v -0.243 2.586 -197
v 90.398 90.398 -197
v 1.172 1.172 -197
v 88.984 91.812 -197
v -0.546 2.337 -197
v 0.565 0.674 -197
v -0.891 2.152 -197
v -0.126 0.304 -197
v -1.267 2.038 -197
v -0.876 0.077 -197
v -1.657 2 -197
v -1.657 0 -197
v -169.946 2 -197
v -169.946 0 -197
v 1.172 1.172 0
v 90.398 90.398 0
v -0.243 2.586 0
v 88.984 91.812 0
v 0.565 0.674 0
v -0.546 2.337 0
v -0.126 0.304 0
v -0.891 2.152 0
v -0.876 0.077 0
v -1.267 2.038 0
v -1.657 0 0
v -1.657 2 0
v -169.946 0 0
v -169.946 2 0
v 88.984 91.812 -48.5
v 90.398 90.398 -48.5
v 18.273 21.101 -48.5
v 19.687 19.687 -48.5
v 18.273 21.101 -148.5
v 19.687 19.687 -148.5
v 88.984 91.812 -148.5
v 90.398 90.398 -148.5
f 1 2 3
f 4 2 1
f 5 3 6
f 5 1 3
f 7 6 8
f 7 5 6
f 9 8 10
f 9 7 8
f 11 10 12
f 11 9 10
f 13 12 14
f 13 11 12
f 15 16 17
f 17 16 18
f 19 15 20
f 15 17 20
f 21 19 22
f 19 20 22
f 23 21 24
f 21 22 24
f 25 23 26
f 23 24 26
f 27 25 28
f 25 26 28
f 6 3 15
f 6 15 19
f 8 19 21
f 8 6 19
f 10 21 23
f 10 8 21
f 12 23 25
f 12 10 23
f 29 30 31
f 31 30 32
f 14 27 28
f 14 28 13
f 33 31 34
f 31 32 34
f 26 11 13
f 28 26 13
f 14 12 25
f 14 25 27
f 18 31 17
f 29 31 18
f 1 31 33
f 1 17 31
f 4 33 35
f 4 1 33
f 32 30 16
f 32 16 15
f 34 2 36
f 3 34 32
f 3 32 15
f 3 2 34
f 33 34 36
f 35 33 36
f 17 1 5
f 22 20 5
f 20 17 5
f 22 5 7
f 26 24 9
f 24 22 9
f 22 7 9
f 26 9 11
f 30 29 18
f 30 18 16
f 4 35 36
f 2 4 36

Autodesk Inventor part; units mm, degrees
ref_plane "YZ Plane" through (0, 0, 0) normal (1, 0, 0) x (0, 1, 0)
ref_plane "XZ Plane" through (0, 0, 0) normal (0, 1, 0) x (-1, 0, 0)
ref_plane "XY Plane" through (0, 0, 0) normal (0, 0, 1) x (1, 0, 0)
sketch "Sketch1" plane through (0, 0, 0) normal (0, 1, 0) x (-1, 0, 0)
  line L0 (0, 0) -> (169.946, 0)
  line L1 (169.946, 0) -> (169.946, -197)
  line L2 (169.946, -197) -> (0, -197)
  line L3 (0, -197) -> (0, 0)
  dimension "d0" = 197
  dimension "d1" = 169.946
extrude "Plate1" add sketch "Sketch1" along normal blind 2
sketch "Sketch2" plane through (-1.4142, 1.4142, -197) normal (0.7071068, -0.7071068, 0) x (0.7071068, 0.7071068, 0)
  line L0 (0, 197) -> (0, 0)
  line L1 (0, 0) -> (127.842, 0)
  line L2 (127.842, 0) -> (127.842, 197)
  line L3 (127.842, 197) -> (0, 197)
edge flange "Flange1" height 127.842 angle 45 thickness 2 bend radius 2 thickness toward (0.7071068, -0.7071068, 0) relief tear relief width 2 relief depth 1 edges at (0, 2, -98.5) wall of the first edge with corners at (-1.4142, 1.4142, 0) (-1.4142, 1.4142, -197) (88.9837, 91.8122, -197) (88.9837, 91.8122, 0)
bend "Bend1"
corner "Corner1"
sketch "Sketch3" plane through (90.3979, 90.3979, 0) normal (0.7071068, -0.7071068, 0) x (-0.7071068, -0.7071068, 0)
  line L0 (0, 48.5) -> (100, 48.5)
  line L1 (100, 48.5) -> (100, 148.5)
  line L2 (100, 148.5) -> (0, 148.5)
  line L3 (0, 148.5) -> (0, 48.5)
  line L4 (0, 197) -> (126.1851, 197) projected
  line L5 (0, 0) -> (0, 197) projected
  point P0 (127.842, 0)
  point P1 (63.0926, 197)
  dimension "d13" = 100
  dimension "d14" = 100
  dimension "d15" = 48.5
extrude "Cut1" cut sketch "Sketch3" against normal blind 2
equation "\"d14\" = d13"
equation "\"d16\" = Thickness"
equation "\"d2\" = Thickness"
equation "\"d3\" = BendReliefWidth"
equation "\"d4\" = BendReliefDepth"
equation "\"d5\" = MinimumRemnant"
equation "\"d6\" = TransitionRadius"
equation "\"d9\" = BendRadius"
equation "\"d10\" = CornerReliefSize"
equation "\"d11\" = GapSize"
equation "\"d12\" = JacobiRadiusSize"
equation "\"BendRadius\" = Thickness"
equation "\"BendReliefWidth\" = Thickness"
equation "\"BendReliefDepth\" = 0.5 * Thickness"
equation "\"CornerReliefSize\" = 4 * Thickness"
equation "\"MinimumRemnant\" = 2 * Thickness"
equation "\"TransitionRadius\" = BendRadius"
equation "\"JacobiRadiusSize\" = BendRadius"
equation "\"GapSize\" = Thickness"
equation "\"Thickness\" = 2"
properties part number "LzC-FrontPLateRS3" material "Steel"
